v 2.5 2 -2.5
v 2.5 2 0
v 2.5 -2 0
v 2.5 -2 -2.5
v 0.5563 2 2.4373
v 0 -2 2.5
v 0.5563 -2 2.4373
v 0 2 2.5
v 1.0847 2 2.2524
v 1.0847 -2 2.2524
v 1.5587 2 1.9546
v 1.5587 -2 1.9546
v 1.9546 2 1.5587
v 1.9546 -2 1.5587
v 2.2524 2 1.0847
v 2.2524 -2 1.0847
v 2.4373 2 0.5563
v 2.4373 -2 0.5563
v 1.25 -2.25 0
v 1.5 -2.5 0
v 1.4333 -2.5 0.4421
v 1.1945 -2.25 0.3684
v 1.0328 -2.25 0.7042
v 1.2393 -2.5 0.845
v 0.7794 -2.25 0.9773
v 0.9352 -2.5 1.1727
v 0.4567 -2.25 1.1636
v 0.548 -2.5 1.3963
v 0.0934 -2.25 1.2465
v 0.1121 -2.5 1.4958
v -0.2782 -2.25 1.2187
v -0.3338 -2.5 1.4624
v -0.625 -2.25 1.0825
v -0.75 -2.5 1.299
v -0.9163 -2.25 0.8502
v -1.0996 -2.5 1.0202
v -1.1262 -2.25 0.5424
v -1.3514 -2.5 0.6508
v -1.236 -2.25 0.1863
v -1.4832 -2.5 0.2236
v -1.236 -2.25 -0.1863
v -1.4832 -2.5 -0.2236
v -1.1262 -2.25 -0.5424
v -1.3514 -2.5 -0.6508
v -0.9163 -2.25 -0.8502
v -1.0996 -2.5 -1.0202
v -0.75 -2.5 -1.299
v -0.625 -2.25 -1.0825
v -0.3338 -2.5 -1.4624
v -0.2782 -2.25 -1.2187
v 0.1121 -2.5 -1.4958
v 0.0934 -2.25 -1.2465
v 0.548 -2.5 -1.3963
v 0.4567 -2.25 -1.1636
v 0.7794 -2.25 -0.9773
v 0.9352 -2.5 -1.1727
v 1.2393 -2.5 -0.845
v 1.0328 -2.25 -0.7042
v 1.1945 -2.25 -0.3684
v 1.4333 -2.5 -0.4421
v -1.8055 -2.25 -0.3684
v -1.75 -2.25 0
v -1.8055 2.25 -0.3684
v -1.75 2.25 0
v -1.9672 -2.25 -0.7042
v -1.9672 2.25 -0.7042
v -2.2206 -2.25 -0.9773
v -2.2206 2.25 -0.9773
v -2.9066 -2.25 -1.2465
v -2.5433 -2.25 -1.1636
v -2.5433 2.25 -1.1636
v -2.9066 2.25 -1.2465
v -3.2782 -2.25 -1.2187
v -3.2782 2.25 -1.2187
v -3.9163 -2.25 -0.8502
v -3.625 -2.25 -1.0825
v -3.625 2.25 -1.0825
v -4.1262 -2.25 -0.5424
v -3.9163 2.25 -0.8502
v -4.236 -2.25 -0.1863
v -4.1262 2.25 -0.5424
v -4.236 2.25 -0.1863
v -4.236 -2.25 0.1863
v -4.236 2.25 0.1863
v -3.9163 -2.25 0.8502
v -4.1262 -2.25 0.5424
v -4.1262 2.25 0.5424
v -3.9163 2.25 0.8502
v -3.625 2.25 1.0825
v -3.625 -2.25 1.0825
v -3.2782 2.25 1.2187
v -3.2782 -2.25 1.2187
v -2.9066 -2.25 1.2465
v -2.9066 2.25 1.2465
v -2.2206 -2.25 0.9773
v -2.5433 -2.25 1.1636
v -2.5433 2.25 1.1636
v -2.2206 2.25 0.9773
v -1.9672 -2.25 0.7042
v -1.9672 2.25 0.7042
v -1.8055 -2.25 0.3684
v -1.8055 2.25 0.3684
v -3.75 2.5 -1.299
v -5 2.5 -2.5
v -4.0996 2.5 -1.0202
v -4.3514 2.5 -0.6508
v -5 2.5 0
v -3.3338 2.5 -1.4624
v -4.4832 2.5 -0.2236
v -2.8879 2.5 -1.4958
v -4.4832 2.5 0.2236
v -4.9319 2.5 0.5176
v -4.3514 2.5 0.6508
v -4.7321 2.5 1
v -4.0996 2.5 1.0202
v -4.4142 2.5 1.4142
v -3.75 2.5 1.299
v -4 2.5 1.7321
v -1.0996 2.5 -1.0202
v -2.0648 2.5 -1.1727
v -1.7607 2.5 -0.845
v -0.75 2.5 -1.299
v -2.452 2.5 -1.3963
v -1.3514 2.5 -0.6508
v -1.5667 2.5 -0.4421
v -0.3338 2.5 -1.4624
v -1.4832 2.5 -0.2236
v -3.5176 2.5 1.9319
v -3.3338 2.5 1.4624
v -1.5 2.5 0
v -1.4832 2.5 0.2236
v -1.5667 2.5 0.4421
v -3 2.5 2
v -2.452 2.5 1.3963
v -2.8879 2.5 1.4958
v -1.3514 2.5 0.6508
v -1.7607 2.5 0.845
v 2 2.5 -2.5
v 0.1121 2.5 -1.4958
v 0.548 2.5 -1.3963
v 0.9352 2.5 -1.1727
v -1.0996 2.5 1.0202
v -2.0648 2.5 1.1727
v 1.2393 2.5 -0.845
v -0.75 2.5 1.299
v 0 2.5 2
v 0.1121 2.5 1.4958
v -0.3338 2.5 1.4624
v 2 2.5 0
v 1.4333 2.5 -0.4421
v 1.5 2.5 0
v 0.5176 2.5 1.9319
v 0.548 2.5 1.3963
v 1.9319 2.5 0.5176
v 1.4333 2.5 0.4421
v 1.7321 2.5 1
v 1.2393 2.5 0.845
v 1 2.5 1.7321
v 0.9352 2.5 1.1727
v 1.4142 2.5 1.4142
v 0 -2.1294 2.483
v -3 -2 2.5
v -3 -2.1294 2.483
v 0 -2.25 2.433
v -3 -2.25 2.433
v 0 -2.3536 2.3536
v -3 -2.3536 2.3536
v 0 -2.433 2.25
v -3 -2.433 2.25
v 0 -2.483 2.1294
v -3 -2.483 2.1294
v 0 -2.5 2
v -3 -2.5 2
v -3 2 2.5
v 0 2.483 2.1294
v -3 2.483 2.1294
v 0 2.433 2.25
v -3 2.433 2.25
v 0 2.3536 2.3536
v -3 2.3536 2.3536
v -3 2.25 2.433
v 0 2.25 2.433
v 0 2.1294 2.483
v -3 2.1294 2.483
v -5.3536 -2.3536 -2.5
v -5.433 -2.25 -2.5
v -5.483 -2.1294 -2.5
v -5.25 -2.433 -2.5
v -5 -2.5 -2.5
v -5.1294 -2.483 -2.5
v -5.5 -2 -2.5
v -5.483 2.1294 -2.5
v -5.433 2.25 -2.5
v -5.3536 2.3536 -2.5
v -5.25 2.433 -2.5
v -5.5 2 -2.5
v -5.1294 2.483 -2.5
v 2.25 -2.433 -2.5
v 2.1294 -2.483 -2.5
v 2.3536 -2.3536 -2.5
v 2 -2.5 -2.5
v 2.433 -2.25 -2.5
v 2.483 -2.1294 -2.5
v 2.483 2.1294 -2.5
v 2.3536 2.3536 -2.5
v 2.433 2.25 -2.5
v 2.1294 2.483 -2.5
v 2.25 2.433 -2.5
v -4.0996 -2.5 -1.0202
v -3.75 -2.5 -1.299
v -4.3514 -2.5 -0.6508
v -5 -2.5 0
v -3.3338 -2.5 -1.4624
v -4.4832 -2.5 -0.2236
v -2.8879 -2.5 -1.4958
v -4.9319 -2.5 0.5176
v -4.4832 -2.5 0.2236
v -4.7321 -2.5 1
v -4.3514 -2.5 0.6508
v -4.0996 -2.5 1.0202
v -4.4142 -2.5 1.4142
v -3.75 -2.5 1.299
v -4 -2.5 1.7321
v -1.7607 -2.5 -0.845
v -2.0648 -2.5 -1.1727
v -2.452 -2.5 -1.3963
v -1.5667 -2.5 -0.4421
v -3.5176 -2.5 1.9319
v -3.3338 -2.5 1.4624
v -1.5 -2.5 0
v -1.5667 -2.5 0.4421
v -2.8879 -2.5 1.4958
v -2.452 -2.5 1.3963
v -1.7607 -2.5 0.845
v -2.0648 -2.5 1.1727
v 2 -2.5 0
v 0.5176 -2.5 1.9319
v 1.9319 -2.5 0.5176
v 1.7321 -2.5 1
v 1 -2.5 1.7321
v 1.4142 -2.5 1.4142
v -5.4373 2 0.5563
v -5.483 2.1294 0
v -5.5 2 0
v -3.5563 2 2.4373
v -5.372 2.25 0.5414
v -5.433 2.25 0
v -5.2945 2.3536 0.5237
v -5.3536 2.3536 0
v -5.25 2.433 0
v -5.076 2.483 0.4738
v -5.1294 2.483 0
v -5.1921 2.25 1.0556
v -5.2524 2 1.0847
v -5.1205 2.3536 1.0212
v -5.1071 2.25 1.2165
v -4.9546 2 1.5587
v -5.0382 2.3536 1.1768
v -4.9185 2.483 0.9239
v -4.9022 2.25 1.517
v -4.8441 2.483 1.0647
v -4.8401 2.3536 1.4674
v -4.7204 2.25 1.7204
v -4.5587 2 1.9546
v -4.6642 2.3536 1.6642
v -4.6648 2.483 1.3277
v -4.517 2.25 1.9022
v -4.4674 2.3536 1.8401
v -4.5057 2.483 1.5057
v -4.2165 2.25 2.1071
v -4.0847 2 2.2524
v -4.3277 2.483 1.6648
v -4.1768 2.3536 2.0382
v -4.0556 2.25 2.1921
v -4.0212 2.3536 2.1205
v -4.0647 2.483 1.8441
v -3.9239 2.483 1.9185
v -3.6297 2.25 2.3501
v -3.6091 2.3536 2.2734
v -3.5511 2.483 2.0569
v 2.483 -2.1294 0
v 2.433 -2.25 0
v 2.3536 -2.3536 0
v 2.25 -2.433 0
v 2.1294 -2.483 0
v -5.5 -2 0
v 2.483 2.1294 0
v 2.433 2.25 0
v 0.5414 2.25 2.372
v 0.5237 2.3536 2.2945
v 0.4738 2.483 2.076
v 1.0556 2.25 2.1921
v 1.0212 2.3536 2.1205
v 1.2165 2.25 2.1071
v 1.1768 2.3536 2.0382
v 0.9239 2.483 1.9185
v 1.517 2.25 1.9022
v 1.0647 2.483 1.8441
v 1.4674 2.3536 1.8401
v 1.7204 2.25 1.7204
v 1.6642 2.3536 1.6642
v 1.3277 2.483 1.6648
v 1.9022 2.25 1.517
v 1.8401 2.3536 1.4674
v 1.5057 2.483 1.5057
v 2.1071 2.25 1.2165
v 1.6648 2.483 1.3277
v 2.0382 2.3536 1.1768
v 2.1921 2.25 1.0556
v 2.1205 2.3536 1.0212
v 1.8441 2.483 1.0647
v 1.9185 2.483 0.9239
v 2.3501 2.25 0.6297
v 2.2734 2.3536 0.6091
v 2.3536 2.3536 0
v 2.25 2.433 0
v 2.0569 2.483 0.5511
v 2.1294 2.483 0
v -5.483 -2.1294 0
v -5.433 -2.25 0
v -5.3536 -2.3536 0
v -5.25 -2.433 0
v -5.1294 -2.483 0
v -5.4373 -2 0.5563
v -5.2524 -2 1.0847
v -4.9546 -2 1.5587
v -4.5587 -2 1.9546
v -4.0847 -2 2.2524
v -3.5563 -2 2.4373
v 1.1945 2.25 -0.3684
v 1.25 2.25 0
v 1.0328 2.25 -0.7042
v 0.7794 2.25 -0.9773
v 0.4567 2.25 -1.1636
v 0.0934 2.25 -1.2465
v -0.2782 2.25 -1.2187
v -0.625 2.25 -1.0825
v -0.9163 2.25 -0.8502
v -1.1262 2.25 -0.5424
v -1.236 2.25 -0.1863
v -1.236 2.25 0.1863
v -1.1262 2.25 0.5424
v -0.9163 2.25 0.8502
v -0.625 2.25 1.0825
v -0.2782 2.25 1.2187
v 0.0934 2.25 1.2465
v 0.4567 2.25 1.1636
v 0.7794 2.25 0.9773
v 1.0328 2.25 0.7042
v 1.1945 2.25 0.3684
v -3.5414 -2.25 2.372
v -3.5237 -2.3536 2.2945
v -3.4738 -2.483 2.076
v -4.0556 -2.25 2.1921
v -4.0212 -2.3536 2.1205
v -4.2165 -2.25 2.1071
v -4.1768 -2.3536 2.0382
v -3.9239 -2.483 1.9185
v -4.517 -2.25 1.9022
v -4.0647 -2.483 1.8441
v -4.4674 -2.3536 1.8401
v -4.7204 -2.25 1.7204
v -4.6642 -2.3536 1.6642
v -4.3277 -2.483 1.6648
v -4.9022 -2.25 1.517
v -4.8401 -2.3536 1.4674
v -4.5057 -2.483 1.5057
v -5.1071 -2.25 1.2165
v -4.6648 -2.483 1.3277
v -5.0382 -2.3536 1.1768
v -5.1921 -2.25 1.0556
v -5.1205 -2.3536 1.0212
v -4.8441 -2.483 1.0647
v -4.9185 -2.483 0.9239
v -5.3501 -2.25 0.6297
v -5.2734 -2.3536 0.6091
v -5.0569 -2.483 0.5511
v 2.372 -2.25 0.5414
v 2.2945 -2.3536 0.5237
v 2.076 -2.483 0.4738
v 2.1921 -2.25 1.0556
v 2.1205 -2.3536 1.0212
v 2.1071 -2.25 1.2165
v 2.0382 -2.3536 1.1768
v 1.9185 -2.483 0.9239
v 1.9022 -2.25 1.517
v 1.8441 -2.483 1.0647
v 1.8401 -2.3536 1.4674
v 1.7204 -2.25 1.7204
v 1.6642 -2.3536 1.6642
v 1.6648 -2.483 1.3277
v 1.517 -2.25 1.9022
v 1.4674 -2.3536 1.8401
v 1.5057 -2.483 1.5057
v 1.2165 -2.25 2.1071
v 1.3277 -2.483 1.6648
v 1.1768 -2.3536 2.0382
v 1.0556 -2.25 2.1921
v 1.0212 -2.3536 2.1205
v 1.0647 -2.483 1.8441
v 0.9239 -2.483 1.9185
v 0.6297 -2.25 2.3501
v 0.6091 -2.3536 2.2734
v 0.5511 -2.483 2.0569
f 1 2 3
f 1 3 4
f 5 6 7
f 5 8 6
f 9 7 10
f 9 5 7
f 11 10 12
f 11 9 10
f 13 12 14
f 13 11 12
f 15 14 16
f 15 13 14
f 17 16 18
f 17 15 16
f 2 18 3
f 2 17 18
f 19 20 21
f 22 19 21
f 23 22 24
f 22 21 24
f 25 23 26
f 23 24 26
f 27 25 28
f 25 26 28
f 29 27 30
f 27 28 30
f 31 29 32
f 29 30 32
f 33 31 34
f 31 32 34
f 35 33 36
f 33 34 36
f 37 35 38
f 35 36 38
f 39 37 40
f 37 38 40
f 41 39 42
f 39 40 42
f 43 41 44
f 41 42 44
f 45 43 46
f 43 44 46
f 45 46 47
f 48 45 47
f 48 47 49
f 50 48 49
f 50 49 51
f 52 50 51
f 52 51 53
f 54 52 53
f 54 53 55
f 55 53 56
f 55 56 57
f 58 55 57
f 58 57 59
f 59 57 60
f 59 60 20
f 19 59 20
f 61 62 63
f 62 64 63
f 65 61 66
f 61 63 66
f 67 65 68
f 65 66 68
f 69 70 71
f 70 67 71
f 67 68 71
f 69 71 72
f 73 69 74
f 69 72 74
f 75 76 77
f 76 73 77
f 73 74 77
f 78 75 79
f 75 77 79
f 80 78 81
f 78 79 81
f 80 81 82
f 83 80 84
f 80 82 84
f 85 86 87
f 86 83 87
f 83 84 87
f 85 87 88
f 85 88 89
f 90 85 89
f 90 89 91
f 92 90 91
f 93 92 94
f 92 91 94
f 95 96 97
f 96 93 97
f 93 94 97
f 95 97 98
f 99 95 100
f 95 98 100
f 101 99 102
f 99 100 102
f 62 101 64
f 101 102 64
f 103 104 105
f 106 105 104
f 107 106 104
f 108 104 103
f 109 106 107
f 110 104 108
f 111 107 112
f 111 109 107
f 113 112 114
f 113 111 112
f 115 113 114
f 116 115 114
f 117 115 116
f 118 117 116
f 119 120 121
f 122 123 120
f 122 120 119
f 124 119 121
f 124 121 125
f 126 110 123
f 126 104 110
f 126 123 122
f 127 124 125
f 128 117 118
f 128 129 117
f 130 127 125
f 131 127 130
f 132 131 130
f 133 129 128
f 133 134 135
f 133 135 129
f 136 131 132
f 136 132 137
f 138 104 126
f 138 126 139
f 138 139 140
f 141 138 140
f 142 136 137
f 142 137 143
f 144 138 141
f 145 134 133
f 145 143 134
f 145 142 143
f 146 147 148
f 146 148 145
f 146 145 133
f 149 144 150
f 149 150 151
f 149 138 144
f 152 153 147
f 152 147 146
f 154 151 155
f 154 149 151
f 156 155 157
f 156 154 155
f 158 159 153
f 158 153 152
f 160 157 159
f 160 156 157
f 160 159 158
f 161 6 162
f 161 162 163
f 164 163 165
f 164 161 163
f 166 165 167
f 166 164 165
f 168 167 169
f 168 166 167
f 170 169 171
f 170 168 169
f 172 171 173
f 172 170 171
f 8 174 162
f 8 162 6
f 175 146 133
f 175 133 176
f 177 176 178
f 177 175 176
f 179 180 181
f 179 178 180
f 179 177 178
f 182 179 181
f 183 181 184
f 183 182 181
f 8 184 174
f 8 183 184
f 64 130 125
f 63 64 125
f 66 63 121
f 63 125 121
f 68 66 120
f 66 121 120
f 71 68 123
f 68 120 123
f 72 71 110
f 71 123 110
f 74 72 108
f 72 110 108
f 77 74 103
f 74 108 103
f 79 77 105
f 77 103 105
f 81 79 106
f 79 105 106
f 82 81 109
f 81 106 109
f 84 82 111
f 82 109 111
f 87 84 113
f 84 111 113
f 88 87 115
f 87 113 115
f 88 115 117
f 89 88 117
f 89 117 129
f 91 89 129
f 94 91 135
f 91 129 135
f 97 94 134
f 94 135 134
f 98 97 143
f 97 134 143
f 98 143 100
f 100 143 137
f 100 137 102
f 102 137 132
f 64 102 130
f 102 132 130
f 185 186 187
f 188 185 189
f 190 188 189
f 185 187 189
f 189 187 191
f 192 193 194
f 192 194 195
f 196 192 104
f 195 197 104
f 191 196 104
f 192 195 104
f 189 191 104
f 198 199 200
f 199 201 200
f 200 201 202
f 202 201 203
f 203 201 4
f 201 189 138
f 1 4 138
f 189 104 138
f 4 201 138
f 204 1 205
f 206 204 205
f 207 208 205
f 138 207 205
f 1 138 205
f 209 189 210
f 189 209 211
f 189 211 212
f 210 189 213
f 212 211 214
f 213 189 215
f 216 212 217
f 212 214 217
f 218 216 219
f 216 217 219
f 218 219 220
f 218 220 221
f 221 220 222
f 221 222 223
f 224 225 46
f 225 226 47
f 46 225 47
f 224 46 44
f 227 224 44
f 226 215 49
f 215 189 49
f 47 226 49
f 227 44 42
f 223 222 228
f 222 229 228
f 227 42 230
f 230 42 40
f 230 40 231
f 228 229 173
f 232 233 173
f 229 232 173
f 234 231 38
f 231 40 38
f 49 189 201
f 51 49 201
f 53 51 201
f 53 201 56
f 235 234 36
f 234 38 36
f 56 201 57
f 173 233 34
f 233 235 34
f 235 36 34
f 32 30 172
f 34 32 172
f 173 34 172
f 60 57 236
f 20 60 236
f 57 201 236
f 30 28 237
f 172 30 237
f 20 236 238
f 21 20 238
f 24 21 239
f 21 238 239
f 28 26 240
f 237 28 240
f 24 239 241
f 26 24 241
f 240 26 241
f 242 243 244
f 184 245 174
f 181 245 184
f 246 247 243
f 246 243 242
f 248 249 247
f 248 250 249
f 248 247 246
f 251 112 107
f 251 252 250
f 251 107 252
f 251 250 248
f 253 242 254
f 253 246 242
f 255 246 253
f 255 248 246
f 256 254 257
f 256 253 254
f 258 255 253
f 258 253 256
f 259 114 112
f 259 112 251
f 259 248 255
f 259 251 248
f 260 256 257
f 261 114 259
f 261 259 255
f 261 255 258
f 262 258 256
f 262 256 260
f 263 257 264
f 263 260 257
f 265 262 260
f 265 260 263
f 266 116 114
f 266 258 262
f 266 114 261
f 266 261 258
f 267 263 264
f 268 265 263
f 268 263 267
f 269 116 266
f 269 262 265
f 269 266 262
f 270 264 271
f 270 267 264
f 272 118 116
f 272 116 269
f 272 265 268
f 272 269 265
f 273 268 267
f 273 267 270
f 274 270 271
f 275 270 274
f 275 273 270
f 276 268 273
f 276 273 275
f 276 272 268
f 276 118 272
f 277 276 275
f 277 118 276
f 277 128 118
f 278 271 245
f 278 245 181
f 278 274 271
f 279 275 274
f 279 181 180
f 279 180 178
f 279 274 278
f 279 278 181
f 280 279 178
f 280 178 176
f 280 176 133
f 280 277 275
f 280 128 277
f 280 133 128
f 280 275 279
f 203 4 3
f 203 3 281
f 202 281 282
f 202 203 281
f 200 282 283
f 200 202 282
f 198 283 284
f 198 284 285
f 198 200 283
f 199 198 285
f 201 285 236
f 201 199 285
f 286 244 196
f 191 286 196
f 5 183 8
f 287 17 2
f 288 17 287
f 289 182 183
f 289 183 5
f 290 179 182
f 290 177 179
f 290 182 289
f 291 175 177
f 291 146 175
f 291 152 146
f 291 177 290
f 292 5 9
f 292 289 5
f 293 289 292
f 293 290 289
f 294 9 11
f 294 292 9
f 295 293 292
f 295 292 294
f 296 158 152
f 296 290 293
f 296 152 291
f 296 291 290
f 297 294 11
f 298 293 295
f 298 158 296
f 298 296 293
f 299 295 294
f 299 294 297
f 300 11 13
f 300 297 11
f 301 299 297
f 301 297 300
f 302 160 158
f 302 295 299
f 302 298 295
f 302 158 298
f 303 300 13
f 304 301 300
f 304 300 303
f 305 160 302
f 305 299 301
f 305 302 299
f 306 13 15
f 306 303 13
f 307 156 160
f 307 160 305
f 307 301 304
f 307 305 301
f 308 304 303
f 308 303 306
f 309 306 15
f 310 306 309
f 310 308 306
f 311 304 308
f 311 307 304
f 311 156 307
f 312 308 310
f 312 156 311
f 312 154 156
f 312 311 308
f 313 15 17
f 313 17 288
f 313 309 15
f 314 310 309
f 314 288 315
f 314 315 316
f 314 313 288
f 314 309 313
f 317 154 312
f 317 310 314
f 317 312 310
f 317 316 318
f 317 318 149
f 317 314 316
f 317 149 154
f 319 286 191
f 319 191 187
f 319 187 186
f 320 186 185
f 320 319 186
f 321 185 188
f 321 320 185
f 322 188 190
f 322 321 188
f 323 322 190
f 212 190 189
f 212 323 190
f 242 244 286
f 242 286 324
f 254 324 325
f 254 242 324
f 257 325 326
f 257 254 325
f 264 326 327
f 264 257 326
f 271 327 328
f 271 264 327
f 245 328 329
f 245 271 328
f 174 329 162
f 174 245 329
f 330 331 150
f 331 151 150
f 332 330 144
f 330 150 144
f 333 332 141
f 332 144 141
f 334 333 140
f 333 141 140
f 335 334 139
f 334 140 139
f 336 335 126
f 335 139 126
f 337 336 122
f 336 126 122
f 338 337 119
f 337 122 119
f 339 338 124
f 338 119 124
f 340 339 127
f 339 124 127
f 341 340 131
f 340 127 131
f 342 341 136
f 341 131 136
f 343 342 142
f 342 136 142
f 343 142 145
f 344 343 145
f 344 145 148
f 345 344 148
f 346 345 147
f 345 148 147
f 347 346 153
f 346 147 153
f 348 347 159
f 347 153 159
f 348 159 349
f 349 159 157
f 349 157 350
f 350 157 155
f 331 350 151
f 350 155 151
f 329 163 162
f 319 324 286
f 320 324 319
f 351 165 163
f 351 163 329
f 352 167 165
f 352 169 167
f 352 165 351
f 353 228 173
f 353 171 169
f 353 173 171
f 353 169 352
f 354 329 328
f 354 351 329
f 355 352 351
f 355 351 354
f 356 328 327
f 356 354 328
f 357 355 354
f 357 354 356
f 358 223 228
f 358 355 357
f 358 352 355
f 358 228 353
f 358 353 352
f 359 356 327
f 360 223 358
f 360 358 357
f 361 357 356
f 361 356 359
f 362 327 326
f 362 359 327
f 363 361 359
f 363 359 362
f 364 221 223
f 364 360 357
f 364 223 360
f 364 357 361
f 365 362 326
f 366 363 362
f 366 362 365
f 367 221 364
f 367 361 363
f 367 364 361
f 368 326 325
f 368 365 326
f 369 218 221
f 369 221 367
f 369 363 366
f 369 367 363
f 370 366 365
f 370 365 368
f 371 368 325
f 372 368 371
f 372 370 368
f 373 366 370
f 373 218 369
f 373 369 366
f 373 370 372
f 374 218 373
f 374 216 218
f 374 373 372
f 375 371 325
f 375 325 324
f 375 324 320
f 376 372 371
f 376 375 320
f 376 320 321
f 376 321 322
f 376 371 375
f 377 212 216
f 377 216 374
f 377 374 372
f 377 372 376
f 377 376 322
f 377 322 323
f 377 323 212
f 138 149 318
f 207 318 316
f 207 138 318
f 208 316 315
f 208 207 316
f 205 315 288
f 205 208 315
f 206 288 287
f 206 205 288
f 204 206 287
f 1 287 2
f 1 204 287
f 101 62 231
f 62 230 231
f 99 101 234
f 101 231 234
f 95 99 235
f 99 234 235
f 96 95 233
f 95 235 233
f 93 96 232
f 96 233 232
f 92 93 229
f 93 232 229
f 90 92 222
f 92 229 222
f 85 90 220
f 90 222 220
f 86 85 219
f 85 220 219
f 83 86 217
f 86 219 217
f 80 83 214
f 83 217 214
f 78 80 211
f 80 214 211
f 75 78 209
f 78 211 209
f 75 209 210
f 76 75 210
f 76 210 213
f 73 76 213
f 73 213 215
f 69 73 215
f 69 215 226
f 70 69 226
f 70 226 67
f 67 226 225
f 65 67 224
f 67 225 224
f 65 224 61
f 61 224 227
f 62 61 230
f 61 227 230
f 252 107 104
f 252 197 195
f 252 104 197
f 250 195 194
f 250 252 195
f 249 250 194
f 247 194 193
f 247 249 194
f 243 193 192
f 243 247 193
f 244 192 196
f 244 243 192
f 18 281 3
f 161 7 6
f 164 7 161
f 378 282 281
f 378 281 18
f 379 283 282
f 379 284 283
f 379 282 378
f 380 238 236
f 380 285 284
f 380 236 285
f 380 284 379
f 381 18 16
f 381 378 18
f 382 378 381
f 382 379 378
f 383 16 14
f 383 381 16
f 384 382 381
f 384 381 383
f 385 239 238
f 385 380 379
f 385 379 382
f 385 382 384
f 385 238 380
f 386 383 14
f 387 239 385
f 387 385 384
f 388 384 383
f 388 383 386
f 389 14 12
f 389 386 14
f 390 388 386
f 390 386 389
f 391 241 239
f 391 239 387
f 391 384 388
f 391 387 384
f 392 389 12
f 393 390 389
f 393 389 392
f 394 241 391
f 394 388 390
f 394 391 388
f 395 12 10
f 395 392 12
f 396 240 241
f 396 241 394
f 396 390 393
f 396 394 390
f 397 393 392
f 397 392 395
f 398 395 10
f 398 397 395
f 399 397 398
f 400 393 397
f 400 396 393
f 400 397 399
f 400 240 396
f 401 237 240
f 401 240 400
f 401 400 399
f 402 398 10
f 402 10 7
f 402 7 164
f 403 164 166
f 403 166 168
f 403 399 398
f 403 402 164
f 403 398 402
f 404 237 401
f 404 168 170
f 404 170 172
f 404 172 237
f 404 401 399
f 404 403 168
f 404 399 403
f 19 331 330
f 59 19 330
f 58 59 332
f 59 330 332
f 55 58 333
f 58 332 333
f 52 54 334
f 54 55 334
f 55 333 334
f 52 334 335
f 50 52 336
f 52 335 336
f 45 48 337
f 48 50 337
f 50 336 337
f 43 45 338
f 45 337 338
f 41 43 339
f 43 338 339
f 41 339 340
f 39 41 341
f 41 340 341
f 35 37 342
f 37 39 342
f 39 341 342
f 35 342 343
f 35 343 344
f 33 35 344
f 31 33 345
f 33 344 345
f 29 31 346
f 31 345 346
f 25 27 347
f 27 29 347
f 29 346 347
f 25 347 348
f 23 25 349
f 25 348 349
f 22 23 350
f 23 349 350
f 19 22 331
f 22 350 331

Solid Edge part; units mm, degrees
sketch "Sketch1" plane through (0, 0, 0) normal (0, -1, 0) x (1, 0, 0)
  circle A0 centre (0, 0) radius 1.25
  circle A1 centre (-3, 0) radius 1.25
  line L0 (-3, 2.5) -> (0, 2.5)
  line L1 (2.5, 0) -> (2.5, -2.5)
  line L2 (0, -2.5) -> (2.5, -2.5)
  line L3 (0, -2.5) -> (-3, -2.5)
  line L4 (-3, -2.5) -> (-5.5, -2.5)
  line L5 (-5.5, 0) -> (-5.5, -2.5)
  arc A2 (-5.5, 0) -> (-3, 2.5) centre (-3, 0) cw
  arc A3 (0, 2.5) -> (2.5, 0) centre (0, 0) cw
extrude "Protrusion1" add sketch "Sketch1" along normal mid plane 5
fillet "Verrundung_1" radius 0.5 10 edges at (-4.7678, -2.5, 1.7678) (-1.5, -2.5, 2.5) (1.7678, -2.5, 1.7678) (2.5, -2.5, -1.25) (-5.5, -2.5, -1.25) (-1.5, 2.5, 2.5) (1.7678, 2.5, 1.7678) (2.5, 2.5, -1.25) (-4.7678, 2.5, 1.7678) (-5.5, 2.5, -1.25)
chamfer "Fase_1" distance 0.25 angle 45 4 edges at (-4.25, -2.5, 0) (-1.25, -2.5, 0) (-4.25, 2.5, 0) (-1.25, 2.5, 0)
properties part number "085" material "PLA"
